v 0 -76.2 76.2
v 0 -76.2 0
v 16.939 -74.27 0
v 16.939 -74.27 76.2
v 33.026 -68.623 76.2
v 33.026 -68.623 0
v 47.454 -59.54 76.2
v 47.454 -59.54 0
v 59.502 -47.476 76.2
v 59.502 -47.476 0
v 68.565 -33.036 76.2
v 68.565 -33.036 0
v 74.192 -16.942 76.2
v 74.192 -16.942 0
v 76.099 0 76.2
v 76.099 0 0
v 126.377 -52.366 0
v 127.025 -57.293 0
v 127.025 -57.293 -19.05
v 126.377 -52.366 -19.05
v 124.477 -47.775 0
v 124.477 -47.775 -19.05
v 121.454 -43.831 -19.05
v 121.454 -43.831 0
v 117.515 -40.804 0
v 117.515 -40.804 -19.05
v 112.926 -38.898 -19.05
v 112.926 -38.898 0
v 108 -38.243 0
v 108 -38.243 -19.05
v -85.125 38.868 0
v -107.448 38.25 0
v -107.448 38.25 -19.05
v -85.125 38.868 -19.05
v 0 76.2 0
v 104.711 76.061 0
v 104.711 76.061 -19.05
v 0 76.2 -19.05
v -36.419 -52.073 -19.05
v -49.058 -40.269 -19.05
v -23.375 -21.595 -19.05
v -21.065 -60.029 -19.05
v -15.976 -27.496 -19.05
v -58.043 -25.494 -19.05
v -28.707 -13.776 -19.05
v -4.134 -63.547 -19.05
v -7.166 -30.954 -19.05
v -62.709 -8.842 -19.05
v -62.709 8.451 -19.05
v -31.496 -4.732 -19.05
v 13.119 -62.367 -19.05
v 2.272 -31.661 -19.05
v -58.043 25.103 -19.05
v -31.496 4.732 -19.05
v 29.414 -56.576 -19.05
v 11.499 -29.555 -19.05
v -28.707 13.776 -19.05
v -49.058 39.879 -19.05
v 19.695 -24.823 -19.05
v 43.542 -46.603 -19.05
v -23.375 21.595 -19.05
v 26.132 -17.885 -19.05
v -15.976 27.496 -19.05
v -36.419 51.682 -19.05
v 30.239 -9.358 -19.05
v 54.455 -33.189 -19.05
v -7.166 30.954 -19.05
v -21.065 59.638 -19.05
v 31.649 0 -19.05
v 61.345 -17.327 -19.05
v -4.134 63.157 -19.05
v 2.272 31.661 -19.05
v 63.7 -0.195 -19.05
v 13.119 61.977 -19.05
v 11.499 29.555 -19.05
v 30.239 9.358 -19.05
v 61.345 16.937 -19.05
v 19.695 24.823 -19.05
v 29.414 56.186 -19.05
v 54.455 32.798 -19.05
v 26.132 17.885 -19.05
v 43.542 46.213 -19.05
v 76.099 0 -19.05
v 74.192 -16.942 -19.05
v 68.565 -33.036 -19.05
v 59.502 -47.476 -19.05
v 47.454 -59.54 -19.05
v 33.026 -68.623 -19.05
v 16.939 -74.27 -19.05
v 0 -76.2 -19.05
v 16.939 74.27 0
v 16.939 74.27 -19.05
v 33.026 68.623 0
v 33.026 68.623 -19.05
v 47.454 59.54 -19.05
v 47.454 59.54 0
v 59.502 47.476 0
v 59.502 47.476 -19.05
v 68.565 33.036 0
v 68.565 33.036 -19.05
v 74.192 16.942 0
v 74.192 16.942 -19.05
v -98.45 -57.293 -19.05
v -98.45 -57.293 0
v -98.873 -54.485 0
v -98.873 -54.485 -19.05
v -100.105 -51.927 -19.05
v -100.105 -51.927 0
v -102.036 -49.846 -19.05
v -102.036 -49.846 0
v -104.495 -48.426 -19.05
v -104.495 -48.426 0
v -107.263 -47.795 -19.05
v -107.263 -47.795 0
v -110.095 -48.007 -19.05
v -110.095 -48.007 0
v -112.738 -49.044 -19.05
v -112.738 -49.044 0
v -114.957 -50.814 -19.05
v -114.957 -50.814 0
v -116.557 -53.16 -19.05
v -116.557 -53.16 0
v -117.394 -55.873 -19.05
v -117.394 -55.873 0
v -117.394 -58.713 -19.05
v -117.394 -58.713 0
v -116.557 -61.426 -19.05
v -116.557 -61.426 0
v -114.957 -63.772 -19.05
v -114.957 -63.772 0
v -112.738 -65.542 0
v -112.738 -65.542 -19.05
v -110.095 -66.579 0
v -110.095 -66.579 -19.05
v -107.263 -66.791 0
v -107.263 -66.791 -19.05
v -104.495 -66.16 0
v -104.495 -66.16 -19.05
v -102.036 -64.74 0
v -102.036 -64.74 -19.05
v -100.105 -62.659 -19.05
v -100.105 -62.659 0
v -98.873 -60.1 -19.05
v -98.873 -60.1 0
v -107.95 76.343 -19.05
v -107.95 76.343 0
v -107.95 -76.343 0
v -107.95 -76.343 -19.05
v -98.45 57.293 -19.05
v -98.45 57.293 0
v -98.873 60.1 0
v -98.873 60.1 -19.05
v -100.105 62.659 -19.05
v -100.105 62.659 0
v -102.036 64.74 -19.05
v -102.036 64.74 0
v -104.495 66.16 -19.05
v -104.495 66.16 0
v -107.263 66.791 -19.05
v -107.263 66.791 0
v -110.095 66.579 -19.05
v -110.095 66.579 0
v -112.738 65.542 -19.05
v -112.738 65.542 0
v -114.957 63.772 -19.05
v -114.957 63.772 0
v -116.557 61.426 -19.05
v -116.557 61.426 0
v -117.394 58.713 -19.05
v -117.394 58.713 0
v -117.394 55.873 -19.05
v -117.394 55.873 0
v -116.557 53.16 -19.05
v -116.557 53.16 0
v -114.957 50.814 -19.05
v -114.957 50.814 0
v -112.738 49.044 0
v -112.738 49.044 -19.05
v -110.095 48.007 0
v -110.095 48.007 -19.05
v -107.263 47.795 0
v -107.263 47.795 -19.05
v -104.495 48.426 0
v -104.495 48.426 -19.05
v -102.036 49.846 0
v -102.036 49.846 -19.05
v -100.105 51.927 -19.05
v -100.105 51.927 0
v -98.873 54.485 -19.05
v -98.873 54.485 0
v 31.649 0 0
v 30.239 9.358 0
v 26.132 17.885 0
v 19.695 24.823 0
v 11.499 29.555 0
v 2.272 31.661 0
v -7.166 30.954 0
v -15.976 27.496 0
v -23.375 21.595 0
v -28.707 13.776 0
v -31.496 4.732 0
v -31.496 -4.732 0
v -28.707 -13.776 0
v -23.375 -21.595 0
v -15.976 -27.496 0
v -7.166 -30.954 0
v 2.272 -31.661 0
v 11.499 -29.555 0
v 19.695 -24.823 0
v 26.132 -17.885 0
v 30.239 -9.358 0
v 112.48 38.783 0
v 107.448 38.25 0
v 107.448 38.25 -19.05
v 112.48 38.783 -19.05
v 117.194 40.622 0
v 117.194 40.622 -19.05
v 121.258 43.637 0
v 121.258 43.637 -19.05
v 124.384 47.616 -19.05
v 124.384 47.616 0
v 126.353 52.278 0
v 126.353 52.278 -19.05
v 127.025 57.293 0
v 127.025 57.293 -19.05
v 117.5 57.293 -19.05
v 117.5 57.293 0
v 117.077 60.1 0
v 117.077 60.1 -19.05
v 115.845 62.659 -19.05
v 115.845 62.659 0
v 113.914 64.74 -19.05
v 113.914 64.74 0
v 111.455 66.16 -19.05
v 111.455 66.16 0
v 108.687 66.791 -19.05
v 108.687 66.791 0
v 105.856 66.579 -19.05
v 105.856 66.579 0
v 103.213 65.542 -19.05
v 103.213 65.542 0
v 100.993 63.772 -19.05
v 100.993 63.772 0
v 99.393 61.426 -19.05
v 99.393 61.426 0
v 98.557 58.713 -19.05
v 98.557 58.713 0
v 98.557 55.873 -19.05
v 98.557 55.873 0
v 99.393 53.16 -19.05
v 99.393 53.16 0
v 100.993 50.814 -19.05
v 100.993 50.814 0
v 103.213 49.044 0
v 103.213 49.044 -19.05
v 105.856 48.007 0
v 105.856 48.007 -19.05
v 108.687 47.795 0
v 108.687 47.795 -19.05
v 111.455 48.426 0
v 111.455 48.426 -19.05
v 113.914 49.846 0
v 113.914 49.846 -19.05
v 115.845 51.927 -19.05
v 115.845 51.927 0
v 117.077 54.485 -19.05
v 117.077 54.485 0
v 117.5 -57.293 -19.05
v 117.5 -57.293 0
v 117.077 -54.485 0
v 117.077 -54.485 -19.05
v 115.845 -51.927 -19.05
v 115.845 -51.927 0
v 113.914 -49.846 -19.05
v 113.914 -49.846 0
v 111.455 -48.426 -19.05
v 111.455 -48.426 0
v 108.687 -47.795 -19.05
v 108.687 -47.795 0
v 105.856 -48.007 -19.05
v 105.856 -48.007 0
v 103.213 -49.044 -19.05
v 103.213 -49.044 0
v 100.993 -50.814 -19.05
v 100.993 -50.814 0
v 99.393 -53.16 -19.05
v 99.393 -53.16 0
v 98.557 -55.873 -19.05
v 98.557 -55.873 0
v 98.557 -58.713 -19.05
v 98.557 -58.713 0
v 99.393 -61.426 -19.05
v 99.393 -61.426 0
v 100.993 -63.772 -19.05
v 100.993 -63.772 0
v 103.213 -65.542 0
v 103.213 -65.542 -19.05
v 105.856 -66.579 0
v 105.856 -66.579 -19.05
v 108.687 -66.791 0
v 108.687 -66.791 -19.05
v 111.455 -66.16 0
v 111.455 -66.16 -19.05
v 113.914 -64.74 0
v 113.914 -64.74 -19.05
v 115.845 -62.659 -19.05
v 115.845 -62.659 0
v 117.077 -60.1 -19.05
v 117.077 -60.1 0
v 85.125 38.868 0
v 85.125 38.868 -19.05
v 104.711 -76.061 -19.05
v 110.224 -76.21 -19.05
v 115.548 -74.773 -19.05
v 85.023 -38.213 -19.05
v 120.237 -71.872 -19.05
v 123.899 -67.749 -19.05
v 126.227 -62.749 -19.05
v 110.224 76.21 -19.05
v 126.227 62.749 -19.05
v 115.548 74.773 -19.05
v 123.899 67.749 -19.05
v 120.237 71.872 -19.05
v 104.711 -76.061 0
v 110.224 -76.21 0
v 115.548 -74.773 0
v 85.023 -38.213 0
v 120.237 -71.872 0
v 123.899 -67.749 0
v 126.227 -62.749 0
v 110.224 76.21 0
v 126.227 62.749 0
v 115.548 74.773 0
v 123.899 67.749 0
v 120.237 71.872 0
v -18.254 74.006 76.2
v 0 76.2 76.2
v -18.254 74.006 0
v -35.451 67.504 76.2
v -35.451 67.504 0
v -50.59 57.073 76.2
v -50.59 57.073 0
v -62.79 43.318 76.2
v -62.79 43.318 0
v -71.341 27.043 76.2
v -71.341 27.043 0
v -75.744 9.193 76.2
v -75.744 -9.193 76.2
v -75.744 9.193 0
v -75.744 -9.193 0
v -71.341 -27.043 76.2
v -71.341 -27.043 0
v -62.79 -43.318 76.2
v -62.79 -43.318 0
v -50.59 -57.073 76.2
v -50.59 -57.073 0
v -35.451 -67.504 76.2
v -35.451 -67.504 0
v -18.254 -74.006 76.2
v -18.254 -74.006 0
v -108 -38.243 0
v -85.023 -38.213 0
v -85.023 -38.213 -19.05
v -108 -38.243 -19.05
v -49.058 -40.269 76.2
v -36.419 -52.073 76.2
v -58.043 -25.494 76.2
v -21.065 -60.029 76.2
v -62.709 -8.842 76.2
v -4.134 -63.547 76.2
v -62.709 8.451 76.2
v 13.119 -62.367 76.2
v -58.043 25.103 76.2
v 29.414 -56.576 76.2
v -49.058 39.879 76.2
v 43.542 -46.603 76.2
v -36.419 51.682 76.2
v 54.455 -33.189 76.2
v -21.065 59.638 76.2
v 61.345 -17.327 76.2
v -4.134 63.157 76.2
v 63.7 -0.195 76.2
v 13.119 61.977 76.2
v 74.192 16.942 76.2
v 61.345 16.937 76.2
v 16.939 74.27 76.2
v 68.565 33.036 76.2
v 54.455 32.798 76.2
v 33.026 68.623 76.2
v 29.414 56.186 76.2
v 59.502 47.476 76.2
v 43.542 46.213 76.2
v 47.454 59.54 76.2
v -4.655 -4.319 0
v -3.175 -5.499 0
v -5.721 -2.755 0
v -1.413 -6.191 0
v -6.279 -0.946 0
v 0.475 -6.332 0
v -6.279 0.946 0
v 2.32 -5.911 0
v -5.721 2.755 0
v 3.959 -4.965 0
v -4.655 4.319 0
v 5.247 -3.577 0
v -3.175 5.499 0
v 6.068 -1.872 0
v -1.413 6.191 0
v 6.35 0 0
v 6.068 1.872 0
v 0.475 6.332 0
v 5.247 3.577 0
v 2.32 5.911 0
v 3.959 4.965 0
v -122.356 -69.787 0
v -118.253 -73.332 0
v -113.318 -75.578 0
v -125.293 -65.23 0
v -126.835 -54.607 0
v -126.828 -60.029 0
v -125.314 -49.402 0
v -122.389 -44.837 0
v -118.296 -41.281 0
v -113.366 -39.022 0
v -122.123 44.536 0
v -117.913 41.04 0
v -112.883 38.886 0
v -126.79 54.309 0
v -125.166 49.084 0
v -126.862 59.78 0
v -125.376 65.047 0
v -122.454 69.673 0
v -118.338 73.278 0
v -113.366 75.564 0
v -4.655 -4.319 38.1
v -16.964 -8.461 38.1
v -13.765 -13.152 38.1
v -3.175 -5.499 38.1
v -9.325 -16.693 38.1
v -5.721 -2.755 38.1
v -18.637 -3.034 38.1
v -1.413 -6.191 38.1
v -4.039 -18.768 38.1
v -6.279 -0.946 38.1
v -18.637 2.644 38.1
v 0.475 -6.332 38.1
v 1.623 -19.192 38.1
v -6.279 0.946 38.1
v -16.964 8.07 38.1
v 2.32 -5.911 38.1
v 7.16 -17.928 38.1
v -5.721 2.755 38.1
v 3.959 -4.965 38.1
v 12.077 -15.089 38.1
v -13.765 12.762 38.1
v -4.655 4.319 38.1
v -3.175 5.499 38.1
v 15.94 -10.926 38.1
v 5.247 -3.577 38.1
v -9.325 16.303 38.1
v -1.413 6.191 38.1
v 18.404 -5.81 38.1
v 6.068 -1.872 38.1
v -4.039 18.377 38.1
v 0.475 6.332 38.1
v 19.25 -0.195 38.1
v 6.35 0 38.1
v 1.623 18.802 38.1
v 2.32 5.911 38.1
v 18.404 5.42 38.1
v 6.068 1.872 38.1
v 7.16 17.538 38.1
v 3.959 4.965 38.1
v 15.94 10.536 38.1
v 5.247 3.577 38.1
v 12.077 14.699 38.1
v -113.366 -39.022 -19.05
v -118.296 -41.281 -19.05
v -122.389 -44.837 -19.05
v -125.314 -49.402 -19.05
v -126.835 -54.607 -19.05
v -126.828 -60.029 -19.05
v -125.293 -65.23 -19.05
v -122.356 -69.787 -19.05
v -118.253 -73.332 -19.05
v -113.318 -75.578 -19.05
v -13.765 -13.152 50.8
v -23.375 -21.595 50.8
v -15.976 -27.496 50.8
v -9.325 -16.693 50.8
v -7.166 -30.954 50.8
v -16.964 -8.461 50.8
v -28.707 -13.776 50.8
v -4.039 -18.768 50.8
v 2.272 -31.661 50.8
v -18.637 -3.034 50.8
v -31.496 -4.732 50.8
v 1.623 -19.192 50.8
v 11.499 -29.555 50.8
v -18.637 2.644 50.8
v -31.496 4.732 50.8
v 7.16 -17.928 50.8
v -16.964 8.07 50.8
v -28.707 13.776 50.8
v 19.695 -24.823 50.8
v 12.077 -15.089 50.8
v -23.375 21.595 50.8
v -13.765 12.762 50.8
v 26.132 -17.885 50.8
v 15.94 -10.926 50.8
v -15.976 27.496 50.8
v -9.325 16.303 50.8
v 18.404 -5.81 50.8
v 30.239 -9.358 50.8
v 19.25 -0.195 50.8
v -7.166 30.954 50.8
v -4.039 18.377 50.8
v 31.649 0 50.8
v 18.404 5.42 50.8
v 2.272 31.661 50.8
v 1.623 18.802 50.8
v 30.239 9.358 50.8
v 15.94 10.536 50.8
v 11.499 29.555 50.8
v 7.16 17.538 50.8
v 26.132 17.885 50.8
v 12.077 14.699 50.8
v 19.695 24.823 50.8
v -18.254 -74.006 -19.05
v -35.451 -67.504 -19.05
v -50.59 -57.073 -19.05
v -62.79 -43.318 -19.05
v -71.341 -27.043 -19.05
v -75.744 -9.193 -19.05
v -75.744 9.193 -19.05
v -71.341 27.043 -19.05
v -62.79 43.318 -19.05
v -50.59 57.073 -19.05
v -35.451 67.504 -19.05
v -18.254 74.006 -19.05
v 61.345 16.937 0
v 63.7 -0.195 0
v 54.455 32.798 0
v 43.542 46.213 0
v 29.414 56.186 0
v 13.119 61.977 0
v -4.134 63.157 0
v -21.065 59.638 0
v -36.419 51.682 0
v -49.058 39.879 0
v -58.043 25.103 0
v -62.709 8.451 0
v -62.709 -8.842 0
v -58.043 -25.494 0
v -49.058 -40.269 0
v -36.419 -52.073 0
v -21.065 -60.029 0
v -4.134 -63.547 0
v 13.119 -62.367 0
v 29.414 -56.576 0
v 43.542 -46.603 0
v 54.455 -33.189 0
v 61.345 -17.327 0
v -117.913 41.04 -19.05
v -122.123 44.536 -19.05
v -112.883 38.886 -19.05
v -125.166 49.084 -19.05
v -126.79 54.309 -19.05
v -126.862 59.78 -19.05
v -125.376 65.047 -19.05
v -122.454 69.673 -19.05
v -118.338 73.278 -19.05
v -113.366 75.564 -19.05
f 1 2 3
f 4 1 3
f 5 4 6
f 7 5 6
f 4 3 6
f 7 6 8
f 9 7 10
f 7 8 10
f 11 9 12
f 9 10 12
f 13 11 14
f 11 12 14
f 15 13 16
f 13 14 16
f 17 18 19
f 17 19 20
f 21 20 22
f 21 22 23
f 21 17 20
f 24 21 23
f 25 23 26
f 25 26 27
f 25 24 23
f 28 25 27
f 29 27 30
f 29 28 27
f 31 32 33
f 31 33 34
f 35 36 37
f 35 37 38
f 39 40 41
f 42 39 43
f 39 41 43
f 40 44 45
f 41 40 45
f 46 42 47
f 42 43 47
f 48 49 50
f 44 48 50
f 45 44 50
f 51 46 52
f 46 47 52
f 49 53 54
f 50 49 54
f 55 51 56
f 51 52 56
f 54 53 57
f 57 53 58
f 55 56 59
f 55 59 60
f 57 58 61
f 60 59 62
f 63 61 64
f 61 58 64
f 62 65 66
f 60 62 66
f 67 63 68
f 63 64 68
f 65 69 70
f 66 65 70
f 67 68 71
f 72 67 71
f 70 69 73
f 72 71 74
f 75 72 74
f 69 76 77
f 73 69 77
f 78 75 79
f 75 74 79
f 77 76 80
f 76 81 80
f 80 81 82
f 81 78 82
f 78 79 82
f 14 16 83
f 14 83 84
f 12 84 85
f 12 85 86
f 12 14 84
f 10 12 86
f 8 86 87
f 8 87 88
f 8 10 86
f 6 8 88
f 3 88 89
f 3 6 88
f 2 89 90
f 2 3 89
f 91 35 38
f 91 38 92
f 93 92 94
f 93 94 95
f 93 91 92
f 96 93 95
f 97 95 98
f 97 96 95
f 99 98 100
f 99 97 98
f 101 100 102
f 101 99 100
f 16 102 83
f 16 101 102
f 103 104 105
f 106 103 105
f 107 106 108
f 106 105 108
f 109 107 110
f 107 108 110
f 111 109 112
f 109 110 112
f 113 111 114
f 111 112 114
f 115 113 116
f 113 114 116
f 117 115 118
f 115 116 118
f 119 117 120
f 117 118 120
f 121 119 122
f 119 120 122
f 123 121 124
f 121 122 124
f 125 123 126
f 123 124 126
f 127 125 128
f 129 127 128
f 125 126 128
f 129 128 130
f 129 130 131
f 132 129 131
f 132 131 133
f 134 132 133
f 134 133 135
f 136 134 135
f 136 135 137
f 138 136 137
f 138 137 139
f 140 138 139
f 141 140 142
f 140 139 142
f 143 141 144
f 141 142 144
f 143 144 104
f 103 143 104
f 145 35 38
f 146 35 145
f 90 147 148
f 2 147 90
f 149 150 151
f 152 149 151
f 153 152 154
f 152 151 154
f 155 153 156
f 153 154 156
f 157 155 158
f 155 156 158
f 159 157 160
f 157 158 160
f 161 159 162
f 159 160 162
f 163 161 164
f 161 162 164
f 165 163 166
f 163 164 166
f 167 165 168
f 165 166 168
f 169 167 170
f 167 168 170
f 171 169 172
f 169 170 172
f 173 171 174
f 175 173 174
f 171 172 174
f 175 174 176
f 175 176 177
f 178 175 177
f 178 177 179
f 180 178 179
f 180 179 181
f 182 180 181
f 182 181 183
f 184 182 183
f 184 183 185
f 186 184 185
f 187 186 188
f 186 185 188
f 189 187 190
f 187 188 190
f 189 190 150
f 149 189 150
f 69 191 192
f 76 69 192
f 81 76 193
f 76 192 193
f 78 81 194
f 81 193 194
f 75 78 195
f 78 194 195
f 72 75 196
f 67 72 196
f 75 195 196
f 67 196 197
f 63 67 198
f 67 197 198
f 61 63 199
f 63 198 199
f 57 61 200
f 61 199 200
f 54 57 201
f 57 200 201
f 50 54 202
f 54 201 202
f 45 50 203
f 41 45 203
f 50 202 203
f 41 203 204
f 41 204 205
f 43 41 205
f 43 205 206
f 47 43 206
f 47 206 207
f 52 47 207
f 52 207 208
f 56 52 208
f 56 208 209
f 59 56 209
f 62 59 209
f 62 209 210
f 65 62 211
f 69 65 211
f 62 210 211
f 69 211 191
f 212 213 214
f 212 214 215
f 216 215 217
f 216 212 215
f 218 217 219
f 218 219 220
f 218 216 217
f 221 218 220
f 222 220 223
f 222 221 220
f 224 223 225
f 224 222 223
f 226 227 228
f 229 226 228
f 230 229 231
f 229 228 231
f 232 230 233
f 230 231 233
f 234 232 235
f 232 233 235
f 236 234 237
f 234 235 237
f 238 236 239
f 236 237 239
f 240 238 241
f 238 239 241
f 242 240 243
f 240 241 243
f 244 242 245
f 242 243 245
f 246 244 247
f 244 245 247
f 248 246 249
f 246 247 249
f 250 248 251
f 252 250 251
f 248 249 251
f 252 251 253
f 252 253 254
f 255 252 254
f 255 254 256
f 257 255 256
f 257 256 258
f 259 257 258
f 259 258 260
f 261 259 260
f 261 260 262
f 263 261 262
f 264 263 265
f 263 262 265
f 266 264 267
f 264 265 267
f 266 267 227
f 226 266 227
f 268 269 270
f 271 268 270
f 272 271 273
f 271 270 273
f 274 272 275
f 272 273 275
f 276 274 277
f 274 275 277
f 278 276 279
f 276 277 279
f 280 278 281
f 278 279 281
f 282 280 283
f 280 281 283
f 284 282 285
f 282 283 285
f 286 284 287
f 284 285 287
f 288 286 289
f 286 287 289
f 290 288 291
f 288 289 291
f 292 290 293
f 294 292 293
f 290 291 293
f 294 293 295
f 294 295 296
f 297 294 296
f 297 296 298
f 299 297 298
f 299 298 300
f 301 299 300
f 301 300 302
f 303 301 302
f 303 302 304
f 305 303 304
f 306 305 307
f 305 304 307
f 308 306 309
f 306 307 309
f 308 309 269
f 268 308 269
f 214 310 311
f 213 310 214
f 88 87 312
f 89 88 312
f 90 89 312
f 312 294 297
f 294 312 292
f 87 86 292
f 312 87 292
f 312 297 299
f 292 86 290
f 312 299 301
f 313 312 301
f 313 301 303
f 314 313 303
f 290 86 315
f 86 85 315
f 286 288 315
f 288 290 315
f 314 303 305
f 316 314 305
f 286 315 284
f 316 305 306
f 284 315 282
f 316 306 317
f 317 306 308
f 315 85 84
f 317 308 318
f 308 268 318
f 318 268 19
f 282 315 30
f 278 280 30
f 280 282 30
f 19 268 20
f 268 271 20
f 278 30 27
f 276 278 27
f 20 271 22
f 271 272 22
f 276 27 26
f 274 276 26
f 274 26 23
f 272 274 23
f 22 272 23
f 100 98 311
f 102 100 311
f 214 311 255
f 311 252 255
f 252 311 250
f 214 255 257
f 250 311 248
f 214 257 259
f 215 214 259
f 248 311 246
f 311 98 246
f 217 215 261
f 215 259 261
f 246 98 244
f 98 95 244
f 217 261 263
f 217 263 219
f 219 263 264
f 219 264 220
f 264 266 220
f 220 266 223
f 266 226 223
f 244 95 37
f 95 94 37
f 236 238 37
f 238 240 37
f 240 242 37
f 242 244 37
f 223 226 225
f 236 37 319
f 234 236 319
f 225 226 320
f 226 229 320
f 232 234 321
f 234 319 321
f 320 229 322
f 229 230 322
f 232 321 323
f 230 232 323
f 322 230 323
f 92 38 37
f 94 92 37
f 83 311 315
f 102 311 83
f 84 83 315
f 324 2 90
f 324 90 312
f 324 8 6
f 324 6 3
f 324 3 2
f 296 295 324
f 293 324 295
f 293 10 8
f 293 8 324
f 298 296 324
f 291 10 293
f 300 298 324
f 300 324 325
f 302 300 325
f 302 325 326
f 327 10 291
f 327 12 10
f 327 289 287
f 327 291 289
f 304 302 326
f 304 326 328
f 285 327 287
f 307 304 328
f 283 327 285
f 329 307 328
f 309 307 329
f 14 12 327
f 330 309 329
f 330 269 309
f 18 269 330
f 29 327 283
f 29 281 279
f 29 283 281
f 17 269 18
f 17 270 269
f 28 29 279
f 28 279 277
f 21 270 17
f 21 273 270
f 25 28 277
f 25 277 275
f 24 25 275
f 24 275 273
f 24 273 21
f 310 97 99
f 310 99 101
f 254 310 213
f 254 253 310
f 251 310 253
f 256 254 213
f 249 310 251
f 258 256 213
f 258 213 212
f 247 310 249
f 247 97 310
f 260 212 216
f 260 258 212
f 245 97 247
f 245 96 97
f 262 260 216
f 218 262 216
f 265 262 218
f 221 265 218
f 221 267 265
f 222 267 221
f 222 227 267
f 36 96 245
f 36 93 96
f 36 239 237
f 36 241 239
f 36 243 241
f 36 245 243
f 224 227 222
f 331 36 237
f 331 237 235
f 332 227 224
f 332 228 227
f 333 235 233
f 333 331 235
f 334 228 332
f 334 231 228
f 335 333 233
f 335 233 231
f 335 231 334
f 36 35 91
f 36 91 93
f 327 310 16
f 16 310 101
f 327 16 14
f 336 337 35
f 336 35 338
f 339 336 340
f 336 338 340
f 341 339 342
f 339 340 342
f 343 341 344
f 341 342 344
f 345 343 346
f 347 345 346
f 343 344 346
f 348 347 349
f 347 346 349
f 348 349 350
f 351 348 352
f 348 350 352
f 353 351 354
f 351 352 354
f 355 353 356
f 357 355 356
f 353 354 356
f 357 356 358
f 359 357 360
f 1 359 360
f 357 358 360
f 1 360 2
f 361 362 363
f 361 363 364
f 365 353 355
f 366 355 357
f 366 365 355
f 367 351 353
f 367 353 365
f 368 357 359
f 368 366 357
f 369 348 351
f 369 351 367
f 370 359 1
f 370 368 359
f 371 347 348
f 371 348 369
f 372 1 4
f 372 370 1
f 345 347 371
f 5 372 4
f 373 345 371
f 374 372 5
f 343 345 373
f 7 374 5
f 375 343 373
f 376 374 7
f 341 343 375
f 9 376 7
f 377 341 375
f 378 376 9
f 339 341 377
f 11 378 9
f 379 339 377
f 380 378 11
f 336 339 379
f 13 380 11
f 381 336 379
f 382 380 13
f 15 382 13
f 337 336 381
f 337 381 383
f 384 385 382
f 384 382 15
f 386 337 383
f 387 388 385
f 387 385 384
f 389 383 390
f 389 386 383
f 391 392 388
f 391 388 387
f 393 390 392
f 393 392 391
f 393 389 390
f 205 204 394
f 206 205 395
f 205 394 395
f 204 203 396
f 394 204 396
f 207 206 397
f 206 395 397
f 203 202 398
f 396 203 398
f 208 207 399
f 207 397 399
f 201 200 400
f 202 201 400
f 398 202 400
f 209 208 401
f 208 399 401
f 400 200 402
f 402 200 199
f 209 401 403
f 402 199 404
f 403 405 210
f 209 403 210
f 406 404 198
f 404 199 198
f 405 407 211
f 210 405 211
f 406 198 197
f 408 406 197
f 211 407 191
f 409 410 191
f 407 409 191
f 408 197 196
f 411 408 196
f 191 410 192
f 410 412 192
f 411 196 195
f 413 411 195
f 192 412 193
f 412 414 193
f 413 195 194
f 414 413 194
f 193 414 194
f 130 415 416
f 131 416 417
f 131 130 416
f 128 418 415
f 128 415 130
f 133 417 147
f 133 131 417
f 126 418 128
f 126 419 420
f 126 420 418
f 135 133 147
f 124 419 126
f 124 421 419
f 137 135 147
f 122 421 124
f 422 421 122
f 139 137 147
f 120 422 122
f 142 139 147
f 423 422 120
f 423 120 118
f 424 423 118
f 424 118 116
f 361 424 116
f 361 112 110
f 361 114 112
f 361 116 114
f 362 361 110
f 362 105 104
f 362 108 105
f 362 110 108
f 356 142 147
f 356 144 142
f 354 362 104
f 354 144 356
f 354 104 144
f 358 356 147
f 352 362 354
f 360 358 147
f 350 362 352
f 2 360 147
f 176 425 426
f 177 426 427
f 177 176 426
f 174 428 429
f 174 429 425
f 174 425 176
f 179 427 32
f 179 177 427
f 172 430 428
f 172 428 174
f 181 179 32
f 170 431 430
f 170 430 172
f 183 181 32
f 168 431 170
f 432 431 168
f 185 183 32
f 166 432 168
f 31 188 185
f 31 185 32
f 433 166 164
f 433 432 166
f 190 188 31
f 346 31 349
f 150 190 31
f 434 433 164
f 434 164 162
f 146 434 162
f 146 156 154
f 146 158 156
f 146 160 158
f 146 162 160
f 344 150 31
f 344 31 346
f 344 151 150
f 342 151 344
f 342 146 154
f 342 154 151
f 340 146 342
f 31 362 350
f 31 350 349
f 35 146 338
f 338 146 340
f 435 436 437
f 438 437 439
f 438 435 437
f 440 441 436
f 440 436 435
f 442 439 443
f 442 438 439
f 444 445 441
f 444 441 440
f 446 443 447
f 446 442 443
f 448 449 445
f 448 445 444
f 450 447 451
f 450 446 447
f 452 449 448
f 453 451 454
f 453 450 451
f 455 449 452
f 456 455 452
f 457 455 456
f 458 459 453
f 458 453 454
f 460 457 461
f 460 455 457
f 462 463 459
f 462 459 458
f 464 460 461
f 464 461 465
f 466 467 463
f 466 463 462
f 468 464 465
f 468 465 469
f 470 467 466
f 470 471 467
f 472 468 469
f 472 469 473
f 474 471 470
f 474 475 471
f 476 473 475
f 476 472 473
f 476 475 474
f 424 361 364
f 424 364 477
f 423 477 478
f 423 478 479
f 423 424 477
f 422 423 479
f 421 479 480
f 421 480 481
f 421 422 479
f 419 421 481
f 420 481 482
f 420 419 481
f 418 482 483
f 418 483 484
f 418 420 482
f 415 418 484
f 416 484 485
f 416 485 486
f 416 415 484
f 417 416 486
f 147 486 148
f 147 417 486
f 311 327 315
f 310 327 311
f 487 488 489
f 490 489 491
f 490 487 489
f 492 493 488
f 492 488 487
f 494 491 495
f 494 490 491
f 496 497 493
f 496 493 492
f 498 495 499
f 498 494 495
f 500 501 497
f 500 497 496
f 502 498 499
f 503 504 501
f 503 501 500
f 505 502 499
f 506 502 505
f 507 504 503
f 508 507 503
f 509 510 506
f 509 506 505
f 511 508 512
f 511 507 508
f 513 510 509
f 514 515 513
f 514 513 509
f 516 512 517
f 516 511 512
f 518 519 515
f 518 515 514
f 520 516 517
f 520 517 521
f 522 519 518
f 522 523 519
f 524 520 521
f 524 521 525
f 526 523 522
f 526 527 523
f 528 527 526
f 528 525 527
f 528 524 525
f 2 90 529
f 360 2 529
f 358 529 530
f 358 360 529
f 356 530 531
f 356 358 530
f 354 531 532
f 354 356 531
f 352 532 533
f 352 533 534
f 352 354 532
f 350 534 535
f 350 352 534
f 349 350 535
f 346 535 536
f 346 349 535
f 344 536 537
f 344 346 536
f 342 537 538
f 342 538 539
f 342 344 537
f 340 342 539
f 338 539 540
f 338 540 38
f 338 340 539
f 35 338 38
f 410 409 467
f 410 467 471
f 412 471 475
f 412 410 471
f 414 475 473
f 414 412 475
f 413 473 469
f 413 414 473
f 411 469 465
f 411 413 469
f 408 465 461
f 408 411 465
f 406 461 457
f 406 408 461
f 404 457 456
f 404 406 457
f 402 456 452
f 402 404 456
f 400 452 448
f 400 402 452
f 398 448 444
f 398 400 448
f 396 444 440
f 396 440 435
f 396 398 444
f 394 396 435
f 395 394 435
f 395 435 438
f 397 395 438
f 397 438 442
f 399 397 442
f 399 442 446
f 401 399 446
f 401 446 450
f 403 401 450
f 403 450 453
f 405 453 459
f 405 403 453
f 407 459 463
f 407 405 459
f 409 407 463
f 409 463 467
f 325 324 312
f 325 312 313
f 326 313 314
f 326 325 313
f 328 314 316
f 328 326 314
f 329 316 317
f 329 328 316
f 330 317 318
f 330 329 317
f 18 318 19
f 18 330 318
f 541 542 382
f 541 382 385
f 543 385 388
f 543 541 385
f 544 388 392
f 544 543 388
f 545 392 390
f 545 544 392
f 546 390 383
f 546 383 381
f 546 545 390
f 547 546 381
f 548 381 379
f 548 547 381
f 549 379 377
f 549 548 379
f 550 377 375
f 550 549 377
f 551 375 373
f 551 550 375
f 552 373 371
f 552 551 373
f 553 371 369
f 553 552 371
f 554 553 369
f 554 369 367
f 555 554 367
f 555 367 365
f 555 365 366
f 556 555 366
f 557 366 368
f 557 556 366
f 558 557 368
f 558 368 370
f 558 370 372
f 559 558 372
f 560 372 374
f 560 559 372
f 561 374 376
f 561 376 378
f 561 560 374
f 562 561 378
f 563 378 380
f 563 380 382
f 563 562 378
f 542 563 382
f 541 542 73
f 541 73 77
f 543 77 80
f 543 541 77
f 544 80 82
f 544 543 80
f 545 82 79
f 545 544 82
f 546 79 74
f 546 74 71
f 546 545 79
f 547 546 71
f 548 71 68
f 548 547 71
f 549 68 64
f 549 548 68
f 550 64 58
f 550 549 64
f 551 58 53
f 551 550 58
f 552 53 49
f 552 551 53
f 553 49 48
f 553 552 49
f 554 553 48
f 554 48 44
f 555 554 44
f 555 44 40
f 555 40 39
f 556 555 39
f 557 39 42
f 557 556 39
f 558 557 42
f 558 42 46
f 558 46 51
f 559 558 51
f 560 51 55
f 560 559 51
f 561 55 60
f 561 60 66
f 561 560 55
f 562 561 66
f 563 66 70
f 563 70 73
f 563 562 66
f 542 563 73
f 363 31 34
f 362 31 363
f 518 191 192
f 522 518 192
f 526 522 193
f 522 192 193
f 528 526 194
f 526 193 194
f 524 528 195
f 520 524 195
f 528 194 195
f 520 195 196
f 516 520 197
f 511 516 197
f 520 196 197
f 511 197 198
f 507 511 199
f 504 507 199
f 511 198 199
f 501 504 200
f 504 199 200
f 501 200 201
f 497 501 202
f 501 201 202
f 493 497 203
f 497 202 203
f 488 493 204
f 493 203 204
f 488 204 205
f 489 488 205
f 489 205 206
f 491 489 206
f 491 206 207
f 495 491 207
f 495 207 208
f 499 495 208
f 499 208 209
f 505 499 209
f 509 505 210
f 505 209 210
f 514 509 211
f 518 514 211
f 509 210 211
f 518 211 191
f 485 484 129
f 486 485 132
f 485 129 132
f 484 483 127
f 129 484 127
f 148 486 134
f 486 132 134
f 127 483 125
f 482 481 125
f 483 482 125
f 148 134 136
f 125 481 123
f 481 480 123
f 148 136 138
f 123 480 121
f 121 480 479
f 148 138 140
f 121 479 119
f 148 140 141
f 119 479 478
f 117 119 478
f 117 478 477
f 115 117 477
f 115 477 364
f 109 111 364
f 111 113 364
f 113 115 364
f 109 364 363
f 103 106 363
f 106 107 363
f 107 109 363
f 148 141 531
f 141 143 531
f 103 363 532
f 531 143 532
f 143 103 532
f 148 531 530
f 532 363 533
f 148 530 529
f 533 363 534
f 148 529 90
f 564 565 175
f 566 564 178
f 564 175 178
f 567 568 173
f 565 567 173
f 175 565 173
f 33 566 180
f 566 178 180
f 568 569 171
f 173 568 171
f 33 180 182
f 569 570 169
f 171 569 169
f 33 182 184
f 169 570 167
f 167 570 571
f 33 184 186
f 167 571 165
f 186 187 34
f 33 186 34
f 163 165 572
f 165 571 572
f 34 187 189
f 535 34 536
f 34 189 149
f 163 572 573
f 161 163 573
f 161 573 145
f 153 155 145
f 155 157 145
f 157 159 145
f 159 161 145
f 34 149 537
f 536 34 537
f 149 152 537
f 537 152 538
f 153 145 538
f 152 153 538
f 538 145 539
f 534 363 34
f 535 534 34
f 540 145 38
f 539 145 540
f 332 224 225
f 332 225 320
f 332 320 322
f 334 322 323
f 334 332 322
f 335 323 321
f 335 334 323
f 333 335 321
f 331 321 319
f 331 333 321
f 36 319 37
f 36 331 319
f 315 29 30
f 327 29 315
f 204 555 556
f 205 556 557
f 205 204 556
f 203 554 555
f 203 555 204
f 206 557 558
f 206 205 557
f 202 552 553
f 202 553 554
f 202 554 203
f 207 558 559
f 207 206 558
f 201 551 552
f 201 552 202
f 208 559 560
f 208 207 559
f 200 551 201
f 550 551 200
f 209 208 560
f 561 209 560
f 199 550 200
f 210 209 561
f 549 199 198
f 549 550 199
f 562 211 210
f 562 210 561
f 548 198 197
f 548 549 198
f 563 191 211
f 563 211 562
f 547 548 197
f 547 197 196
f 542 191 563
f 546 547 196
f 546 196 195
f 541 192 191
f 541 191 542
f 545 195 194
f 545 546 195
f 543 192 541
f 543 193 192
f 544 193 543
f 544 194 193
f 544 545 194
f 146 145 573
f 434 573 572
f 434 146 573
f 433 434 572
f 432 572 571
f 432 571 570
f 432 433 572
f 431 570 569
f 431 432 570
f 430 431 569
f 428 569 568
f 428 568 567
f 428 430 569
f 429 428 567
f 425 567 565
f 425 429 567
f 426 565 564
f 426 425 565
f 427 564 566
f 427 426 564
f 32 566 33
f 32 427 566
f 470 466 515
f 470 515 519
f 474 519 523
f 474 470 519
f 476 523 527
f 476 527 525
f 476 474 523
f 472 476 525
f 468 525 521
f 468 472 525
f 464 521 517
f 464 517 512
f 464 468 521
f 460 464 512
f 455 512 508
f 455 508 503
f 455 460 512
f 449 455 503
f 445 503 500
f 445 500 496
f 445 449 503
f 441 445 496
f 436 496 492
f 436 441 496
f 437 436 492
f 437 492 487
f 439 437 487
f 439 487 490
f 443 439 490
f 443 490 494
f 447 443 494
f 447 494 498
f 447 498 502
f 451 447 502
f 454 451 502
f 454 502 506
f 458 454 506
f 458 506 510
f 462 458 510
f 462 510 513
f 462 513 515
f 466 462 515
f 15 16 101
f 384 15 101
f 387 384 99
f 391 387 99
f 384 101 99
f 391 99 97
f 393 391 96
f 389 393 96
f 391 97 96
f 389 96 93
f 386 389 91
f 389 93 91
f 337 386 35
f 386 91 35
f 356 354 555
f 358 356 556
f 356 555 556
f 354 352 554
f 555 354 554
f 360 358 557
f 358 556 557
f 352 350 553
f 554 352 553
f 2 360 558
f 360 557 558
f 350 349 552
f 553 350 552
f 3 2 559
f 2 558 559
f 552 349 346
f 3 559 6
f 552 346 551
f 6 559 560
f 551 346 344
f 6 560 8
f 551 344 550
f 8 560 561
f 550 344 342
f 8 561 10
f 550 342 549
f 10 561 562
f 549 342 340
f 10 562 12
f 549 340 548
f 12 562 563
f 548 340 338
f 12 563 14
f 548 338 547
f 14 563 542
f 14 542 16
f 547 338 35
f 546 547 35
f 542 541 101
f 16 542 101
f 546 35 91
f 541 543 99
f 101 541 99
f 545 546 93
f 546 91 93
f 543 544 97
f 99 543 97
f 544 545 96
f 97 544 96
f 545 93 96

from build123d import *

# Parameters (mm, degrees)
F0_R     = 9.525
F0_R_2   = 63.5
F0_R_3   = 31.75
F1_DEPTH = 19.05
F0_R_4   = 19.05
F2_DEPTH = 50.8
F3_DEPTH = 76.2
F0_R_5   = 6.35
F4_DEPTH = 38.1


with BuildPart() as f1:
    # F0 (on Top) → F1 (new body)
    with BuildSketch(Plane.XY):
        with BuildLine():
            ThreePointArc((-88.925138, 57.292937), (-94.495836, 70.754397), (-107.949905, 76.342921))
            ThreePointArc((-107.949905, 76.342921), (-127.023485, 57.041994), (-107.448071, 38.25023))
            ThreePointArc((-107.448071, 38.25023), (-94.319679, 44.010207), (-88.925138, 57.292937))
        make_face()
        with Locations((-107.975138, 57.292937)):
            Circle(F0_R, mode=Mode.SUBTRACT)
        with BuildLine():
            ThreePointArc((-108.000371, -38.242954), (-127.025122, -57.31817), (-107.949905, -76.342921))
            ThreePointArc((-107.949905, -76.342921), (-94.495836, -70.754397), (-88.925138, -57.292937))
            ThreePointArc((-88.925138, -57.292937), (-94.513678, -43.813635), (-108.000371, -38.242954))
        make_face()
        with Locations((-107.975138, -57.292937)):
            Circle(F0_R, mode=Mode.SUBTRACT)
        with BuildLine():
            ThreePointArc((127.025138, 57.292937), (120.237356, 71.871707), (104.711172, 76.061236))
            ThreePointArc((104.711172, 76.061236), (88.974848, 55.917627), (107.448071, 38.25023))
            ThreePointArc((107.448071, 38.25023), (121.257869, 43.637478), (127.025138, 57.292937))
        make_face()
        with Locations((107.975138, 57.292937)):
            Circle(F0_R, mode=Mode.SUBTRACT)
        with BuildLine():
            ThreePointArc((108.000371, -38.242954), (88.996783, -55.642318), (104.711172, -76.061236))
            ThreePointArc((104.711172, -76.061236), (120.237356, -71.871707), (127.025138, -57.292937))
            ThreePointArc((127.025138, -57.292937), (121.454441, -43.831477), (108.000371, -38.242954))
        make_face()
        with Locations((107.975138, -57.292937)):
            Circle(F0_R, mode=Mode.SUBTRACT)
        with Locations((0.19986, -0.195171)):
            Circle(F0_R_2)
        with Locations((-0.100932, 0)):
            Circle(F0_R_3, mode=Mode.SUBTRACT)
        with BuildLine():
            ThreePointArc((0, 76.199933), (53.816278, 53.84584), (76.099068, 0))
            ThreePointArc((76.099068, 0), (53.816278, -53.84584), (0, -76.199933))
            Line((0, -76.199933), (104.711172, -76.061236))
            ThreePointArc((104.711172, -76.061236), (88.996783, -55.642318), (108.000371, -38.242954))
            Line((108.000371, -38.242954), (85.022618, -38.212518))
            Line((85.022618, -38.212518), (85.124717, 38.8681))
            Line((85.124717, 38.8681), (107.448071, 38.25023))
            ThreePointArc((107.448071, 38.25023), (88.974848, 55.917627), (104.711172, 76.061236))
            Line((104.711172, 76.061236), (0, 76.199933))
        make_face()
        with BuildLine():
            ThreePointArc((0, -76.199933), (-76.300932, 0), (0, 76.199933))
            Line((0, 76.199933), (-107.949905, 76.342921))
            ThreePointArc((-107.949905, 76.342921), (-94.495836, 70.754397), (-88.925138, 57.292937))
            ThreePointArc((-88.925138, 57.292937), (-94.319679, 44.010207), (-107.448071, 38.25023))
            Line((-107.448071, 38.25023), (-85.124717, 38.8681))
            Line((-85.124717, 38.8681), (-85.022618, -38.212518))
            Line((-85.022618, -38.212518), (-108.000371, -38.242954))
            ThreePointArc((-108.000371, -38.242954), (-94.513678, -43.813635), (-88.925138, -57.292937))
            ThreePointArc((-88.925138, -57.292937), (-94.495836, -70.754397), (-107.949905, -76.342921))
            Line((-107.949905, -76.342921), (0, -76.199933))
        make_face()
    extrude(amount=-F1_DEPTH)


with BuildPart() as f2:
    # F0 (on Top) → F2 (new body)
    with BuildSketch(Plane.XY):
        with Locations((-0.100932, 0)):
            Circle(F0_R_3)
        with Locations((0.19986, -0.195171)):
            Circle(F0_R_4, mode=Mode.SUBTRACT)
    extrude(amount=F2_DEPTH)

    # F0 (on Top) → F4 (join)
    with BuildSketch(Plane.XY):
        with Locations((0.19986, -0.195171)):
            Circle(F0_R_4)
        Circle(F0_R_5, mode=Mode.SUBTRACT)
    extrude(amount=F4_DEPTH)


with BuildPart() as f3:
    # F0 (on Top) → F3 (new body)
    with BuildSketch(Plane.XY):
        with BuildLine():
            ThreePointArc((0, -76.199933), (53.816278, -53.84584), (76.099068, 0))
            ThreePointArc((76.099068, 0), (53.816278, 53.84584), (0, 76.199933))
            ThreePointArc((0, 76.199933), (-76.300932, 0), (0, -76.199933))
        make_face()
        with Locations((0.19986, -0.195171)):
            Circle(F0_R_2, mode=Mode.SUBTRACT)
    extrude(amount=F3_DEPTH)


solid = Compound([f1.part, f2.part, f3.part])
